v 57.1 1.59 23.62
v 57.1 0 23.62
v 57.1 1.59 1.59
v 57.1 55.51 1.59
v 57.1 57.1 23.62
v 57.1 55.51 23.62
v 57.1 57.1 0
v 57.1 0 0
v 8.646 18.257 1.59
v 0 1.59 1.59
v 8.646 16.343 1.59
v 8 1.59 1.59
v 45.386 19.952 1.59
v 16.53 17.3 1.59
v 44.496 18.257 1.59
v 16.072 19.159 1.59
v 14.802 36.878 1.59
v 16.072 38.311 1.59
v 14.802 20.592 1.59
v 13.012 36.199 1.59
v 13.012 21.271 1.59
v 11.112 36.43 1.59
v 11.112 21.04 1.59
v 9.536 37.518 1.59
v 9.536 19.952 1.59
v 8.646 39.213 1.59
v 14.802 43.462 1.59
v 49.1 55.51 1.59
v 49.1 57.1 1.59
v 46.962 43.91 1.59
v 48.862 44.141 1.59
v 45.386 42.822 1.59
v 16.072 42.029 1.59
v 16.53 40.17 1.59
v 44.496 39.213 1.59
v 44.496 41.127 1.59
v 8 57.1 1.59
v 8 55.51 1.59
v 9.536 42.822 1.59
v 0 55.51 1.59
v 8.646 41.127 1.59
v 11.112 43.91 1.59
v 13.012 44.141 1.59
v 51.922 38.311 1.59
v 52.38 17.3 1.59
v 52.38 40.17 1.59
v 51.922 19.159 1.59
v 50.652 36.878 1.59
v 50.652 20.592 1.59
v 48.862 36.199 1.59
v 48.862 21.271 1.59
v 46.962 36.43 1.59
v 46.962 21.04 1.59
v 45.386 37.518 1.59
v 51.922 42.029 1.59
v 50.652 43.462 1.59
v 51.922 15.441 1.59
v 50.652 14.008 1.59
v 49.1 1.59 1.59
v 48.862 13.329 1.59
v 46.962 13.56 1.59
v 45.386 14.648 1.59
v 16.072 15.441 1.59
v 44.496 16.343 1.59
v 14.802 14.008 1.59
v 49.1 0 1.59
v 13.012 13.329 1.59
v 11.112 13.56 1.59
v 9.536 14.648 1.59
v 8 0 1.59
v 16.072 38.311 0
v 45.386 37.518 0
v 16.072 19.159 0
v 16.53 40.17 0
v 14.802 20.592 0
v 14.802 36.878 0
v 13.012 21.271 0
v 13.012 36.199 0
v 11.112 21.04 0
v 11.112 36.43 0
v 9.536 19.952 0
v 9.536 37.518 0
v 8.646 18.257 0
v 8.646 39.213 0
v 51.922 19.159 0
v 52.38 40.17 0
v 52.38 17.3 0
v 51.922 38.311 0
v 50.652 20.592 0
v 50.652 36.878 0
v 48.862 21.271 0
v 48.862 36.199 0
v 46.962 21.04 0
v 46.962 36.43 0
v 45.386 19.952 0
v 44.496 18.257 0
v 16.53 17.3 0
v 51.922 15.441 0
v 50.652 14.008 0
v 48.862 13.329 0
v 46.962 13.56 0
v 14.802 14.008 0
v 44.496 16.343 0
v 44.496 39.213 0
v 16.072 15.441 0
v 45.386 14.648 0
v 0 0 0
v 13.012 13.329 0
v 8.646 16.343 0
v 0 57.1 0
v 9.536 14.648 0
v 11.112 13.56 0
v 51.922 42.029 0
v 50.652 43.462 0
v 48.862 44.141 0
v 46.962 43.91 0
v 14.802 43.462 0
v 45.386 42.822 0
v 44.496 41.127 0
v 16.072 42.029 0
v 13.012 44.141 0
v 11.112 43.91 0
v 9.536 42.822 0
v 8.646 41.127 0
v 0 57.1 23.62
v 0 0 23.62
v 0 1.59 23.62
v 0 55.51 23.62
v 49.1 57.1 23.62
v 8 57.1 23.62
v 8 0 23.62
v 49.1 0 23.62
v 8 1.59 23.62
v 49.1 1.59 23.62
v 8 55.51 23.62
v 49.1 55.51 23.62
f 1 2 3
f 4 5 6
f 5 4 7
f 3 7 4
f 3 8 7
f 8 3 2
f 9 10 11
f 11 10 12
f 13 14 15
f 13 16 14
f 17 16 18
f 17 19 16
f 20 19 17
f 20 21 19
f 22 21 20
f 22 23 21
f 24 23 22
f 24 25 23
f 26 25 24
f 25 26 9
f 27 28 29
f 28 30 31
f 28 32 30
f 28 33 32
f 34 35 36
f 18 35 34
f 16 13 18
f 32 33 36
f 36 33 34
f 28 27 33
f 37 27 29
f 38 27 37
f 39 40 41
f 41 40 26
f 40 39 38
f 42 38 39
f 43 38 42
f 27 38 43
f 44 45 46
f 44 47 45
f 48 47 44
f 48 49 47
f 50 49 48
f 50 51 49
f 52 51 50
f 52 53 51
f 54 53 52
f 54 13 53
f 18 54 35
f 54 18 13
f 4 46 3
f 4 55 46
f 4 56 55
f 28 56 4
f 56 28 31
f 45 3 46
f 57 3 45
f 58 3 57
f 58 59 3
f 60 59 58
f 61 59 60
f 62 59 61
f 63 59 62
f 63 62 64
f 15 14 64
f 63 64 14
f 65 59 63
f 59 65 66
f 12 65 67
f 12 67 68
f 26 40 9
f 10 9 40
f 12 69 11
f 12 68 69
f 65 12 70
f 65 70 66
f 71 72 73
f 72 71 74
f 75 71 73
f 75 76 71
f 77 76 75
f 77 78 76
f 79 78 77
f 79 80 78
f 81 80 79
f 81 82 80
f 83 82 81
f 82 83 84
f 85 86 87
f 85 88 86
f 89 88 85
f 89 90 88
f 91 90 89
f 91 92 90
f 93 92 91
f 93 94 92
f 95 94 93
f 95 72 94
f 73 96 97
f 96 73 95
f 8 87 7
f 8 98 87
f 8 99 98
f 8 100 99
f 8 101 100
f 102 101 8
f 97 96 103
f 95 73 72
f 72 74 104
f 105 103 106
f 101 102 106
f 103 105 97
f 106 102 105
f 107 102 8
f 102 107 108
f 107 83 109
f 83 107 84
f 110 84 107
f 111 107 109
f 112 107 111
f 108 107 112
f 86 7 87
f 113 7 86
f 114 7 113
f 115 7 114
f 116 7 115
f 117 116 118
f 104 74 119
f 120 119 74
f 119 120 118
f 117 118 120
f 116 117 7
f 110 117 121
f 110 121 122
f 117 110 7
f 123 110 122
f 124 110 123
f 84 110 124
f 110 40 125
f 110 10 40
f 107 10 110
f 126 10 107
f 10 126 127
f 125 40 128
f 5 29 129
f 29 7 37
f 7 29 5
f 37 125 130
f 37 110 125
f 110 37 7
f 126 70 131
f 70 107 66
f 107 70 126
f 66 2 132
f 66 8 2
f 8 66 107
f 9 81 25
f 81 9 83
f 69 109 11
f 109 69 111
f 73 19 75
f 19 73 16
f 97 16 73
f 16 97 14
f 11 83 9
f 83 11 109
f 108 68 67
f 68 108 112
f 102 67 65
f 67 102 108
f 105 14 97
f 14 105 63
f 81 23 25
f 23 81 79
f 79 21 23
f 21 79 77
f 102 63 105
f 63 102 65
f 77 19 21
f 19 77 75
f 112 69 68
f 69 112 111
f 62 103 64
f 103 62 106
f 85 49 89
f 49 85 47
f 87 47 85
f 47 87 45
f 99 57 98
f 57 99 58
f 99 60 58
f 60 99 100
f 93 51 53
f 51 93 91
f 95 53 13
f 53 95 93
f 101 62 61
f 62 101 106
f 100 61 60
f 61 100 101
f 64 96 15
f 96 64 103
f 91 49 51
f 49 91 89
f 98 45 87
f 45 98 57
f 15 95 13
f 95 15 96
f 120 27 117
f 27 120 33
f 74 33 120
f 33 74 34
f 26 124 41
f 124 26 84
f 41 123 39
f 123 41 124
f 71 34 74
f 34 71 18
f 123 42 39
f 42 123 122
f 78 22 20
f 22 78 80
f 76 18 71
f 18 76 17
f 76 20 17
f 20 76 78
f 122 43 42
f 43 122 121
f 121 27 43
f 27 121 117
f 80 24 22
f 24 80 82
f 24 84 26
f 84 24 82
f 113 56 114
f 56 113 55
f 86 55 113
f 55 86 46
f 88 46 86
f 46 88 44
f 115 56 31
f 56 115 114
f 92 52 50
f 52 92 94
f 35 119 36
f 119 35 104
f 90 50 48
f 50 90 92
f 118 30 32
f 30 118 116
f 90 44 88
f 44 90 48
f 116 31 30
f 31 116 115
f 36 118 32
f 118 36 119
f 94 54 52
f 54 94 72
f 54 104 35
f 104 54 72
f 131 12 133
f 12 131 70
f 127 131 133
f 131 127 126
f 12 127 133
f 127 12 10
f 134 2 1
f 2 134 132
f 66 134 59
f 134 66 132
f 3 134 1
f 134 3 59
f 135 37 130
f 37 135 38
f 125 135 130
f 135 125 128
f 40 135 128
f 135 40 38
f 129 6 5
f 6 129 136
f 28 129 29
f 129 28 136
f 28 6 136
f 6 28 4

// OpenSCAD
latime_suport = 57.1;
lungime_suport =  57.1;
grosime_suport = 1.59;
inaltime_suport = 23.62;

raza_gaura = 8/2;
distanta_gauri_x = 27.85;
distanta_gauri_y = 14.87;
poz_gaura_x = 8.53;
poz_gaura_y = 13.30;
latime_picior = 8;
union() {

difference() {
	cube([latime_suport, lungime_suport, grosime_suport]);
	translate([poz_gaura_x + raza_gaura, poz_gaura_y+raza_gaura, 0])
	cylinder(h=10, r = raza_gaura);

	translate([poz_gaura_x + 3*raza_gaura + distanta_gauri_x, poz_gaura_y+raza_gaura, 0])
	cylinder(h=10, r = raza_gaura);

	translate([poz_gaura_x + raza_gaura, poz_gaura_y+3*raza_gaura+distanta_gauri_y, 0])
	cylinder(h=10, r = raza_gaura);

	translate([poz_gaura_x + 3*raza_gaura + distanta_gauri_x,  poz_gaura_y+3*raza_gaura+distanta_gauri_y, 0])
	cylinder(h=10, r = raza_gaura);
}


cube([latime_picior,grosime_suport, inaltime_suport]);
translate([latime_suport - latime_picior, 0, 0])
cube([latime_picior,grosime_suport, inaltime_suport]);

translate([0, lungime_suport-grosime_suport, 0])
cube([latime_picior,grosime_suport, inaltime_suport]);

translate([latime_suport - latime_picior, lungime_suport-grosime_suport, 0])
cube([latime_picior,grosime_suport, inaltime_suport]);
}
